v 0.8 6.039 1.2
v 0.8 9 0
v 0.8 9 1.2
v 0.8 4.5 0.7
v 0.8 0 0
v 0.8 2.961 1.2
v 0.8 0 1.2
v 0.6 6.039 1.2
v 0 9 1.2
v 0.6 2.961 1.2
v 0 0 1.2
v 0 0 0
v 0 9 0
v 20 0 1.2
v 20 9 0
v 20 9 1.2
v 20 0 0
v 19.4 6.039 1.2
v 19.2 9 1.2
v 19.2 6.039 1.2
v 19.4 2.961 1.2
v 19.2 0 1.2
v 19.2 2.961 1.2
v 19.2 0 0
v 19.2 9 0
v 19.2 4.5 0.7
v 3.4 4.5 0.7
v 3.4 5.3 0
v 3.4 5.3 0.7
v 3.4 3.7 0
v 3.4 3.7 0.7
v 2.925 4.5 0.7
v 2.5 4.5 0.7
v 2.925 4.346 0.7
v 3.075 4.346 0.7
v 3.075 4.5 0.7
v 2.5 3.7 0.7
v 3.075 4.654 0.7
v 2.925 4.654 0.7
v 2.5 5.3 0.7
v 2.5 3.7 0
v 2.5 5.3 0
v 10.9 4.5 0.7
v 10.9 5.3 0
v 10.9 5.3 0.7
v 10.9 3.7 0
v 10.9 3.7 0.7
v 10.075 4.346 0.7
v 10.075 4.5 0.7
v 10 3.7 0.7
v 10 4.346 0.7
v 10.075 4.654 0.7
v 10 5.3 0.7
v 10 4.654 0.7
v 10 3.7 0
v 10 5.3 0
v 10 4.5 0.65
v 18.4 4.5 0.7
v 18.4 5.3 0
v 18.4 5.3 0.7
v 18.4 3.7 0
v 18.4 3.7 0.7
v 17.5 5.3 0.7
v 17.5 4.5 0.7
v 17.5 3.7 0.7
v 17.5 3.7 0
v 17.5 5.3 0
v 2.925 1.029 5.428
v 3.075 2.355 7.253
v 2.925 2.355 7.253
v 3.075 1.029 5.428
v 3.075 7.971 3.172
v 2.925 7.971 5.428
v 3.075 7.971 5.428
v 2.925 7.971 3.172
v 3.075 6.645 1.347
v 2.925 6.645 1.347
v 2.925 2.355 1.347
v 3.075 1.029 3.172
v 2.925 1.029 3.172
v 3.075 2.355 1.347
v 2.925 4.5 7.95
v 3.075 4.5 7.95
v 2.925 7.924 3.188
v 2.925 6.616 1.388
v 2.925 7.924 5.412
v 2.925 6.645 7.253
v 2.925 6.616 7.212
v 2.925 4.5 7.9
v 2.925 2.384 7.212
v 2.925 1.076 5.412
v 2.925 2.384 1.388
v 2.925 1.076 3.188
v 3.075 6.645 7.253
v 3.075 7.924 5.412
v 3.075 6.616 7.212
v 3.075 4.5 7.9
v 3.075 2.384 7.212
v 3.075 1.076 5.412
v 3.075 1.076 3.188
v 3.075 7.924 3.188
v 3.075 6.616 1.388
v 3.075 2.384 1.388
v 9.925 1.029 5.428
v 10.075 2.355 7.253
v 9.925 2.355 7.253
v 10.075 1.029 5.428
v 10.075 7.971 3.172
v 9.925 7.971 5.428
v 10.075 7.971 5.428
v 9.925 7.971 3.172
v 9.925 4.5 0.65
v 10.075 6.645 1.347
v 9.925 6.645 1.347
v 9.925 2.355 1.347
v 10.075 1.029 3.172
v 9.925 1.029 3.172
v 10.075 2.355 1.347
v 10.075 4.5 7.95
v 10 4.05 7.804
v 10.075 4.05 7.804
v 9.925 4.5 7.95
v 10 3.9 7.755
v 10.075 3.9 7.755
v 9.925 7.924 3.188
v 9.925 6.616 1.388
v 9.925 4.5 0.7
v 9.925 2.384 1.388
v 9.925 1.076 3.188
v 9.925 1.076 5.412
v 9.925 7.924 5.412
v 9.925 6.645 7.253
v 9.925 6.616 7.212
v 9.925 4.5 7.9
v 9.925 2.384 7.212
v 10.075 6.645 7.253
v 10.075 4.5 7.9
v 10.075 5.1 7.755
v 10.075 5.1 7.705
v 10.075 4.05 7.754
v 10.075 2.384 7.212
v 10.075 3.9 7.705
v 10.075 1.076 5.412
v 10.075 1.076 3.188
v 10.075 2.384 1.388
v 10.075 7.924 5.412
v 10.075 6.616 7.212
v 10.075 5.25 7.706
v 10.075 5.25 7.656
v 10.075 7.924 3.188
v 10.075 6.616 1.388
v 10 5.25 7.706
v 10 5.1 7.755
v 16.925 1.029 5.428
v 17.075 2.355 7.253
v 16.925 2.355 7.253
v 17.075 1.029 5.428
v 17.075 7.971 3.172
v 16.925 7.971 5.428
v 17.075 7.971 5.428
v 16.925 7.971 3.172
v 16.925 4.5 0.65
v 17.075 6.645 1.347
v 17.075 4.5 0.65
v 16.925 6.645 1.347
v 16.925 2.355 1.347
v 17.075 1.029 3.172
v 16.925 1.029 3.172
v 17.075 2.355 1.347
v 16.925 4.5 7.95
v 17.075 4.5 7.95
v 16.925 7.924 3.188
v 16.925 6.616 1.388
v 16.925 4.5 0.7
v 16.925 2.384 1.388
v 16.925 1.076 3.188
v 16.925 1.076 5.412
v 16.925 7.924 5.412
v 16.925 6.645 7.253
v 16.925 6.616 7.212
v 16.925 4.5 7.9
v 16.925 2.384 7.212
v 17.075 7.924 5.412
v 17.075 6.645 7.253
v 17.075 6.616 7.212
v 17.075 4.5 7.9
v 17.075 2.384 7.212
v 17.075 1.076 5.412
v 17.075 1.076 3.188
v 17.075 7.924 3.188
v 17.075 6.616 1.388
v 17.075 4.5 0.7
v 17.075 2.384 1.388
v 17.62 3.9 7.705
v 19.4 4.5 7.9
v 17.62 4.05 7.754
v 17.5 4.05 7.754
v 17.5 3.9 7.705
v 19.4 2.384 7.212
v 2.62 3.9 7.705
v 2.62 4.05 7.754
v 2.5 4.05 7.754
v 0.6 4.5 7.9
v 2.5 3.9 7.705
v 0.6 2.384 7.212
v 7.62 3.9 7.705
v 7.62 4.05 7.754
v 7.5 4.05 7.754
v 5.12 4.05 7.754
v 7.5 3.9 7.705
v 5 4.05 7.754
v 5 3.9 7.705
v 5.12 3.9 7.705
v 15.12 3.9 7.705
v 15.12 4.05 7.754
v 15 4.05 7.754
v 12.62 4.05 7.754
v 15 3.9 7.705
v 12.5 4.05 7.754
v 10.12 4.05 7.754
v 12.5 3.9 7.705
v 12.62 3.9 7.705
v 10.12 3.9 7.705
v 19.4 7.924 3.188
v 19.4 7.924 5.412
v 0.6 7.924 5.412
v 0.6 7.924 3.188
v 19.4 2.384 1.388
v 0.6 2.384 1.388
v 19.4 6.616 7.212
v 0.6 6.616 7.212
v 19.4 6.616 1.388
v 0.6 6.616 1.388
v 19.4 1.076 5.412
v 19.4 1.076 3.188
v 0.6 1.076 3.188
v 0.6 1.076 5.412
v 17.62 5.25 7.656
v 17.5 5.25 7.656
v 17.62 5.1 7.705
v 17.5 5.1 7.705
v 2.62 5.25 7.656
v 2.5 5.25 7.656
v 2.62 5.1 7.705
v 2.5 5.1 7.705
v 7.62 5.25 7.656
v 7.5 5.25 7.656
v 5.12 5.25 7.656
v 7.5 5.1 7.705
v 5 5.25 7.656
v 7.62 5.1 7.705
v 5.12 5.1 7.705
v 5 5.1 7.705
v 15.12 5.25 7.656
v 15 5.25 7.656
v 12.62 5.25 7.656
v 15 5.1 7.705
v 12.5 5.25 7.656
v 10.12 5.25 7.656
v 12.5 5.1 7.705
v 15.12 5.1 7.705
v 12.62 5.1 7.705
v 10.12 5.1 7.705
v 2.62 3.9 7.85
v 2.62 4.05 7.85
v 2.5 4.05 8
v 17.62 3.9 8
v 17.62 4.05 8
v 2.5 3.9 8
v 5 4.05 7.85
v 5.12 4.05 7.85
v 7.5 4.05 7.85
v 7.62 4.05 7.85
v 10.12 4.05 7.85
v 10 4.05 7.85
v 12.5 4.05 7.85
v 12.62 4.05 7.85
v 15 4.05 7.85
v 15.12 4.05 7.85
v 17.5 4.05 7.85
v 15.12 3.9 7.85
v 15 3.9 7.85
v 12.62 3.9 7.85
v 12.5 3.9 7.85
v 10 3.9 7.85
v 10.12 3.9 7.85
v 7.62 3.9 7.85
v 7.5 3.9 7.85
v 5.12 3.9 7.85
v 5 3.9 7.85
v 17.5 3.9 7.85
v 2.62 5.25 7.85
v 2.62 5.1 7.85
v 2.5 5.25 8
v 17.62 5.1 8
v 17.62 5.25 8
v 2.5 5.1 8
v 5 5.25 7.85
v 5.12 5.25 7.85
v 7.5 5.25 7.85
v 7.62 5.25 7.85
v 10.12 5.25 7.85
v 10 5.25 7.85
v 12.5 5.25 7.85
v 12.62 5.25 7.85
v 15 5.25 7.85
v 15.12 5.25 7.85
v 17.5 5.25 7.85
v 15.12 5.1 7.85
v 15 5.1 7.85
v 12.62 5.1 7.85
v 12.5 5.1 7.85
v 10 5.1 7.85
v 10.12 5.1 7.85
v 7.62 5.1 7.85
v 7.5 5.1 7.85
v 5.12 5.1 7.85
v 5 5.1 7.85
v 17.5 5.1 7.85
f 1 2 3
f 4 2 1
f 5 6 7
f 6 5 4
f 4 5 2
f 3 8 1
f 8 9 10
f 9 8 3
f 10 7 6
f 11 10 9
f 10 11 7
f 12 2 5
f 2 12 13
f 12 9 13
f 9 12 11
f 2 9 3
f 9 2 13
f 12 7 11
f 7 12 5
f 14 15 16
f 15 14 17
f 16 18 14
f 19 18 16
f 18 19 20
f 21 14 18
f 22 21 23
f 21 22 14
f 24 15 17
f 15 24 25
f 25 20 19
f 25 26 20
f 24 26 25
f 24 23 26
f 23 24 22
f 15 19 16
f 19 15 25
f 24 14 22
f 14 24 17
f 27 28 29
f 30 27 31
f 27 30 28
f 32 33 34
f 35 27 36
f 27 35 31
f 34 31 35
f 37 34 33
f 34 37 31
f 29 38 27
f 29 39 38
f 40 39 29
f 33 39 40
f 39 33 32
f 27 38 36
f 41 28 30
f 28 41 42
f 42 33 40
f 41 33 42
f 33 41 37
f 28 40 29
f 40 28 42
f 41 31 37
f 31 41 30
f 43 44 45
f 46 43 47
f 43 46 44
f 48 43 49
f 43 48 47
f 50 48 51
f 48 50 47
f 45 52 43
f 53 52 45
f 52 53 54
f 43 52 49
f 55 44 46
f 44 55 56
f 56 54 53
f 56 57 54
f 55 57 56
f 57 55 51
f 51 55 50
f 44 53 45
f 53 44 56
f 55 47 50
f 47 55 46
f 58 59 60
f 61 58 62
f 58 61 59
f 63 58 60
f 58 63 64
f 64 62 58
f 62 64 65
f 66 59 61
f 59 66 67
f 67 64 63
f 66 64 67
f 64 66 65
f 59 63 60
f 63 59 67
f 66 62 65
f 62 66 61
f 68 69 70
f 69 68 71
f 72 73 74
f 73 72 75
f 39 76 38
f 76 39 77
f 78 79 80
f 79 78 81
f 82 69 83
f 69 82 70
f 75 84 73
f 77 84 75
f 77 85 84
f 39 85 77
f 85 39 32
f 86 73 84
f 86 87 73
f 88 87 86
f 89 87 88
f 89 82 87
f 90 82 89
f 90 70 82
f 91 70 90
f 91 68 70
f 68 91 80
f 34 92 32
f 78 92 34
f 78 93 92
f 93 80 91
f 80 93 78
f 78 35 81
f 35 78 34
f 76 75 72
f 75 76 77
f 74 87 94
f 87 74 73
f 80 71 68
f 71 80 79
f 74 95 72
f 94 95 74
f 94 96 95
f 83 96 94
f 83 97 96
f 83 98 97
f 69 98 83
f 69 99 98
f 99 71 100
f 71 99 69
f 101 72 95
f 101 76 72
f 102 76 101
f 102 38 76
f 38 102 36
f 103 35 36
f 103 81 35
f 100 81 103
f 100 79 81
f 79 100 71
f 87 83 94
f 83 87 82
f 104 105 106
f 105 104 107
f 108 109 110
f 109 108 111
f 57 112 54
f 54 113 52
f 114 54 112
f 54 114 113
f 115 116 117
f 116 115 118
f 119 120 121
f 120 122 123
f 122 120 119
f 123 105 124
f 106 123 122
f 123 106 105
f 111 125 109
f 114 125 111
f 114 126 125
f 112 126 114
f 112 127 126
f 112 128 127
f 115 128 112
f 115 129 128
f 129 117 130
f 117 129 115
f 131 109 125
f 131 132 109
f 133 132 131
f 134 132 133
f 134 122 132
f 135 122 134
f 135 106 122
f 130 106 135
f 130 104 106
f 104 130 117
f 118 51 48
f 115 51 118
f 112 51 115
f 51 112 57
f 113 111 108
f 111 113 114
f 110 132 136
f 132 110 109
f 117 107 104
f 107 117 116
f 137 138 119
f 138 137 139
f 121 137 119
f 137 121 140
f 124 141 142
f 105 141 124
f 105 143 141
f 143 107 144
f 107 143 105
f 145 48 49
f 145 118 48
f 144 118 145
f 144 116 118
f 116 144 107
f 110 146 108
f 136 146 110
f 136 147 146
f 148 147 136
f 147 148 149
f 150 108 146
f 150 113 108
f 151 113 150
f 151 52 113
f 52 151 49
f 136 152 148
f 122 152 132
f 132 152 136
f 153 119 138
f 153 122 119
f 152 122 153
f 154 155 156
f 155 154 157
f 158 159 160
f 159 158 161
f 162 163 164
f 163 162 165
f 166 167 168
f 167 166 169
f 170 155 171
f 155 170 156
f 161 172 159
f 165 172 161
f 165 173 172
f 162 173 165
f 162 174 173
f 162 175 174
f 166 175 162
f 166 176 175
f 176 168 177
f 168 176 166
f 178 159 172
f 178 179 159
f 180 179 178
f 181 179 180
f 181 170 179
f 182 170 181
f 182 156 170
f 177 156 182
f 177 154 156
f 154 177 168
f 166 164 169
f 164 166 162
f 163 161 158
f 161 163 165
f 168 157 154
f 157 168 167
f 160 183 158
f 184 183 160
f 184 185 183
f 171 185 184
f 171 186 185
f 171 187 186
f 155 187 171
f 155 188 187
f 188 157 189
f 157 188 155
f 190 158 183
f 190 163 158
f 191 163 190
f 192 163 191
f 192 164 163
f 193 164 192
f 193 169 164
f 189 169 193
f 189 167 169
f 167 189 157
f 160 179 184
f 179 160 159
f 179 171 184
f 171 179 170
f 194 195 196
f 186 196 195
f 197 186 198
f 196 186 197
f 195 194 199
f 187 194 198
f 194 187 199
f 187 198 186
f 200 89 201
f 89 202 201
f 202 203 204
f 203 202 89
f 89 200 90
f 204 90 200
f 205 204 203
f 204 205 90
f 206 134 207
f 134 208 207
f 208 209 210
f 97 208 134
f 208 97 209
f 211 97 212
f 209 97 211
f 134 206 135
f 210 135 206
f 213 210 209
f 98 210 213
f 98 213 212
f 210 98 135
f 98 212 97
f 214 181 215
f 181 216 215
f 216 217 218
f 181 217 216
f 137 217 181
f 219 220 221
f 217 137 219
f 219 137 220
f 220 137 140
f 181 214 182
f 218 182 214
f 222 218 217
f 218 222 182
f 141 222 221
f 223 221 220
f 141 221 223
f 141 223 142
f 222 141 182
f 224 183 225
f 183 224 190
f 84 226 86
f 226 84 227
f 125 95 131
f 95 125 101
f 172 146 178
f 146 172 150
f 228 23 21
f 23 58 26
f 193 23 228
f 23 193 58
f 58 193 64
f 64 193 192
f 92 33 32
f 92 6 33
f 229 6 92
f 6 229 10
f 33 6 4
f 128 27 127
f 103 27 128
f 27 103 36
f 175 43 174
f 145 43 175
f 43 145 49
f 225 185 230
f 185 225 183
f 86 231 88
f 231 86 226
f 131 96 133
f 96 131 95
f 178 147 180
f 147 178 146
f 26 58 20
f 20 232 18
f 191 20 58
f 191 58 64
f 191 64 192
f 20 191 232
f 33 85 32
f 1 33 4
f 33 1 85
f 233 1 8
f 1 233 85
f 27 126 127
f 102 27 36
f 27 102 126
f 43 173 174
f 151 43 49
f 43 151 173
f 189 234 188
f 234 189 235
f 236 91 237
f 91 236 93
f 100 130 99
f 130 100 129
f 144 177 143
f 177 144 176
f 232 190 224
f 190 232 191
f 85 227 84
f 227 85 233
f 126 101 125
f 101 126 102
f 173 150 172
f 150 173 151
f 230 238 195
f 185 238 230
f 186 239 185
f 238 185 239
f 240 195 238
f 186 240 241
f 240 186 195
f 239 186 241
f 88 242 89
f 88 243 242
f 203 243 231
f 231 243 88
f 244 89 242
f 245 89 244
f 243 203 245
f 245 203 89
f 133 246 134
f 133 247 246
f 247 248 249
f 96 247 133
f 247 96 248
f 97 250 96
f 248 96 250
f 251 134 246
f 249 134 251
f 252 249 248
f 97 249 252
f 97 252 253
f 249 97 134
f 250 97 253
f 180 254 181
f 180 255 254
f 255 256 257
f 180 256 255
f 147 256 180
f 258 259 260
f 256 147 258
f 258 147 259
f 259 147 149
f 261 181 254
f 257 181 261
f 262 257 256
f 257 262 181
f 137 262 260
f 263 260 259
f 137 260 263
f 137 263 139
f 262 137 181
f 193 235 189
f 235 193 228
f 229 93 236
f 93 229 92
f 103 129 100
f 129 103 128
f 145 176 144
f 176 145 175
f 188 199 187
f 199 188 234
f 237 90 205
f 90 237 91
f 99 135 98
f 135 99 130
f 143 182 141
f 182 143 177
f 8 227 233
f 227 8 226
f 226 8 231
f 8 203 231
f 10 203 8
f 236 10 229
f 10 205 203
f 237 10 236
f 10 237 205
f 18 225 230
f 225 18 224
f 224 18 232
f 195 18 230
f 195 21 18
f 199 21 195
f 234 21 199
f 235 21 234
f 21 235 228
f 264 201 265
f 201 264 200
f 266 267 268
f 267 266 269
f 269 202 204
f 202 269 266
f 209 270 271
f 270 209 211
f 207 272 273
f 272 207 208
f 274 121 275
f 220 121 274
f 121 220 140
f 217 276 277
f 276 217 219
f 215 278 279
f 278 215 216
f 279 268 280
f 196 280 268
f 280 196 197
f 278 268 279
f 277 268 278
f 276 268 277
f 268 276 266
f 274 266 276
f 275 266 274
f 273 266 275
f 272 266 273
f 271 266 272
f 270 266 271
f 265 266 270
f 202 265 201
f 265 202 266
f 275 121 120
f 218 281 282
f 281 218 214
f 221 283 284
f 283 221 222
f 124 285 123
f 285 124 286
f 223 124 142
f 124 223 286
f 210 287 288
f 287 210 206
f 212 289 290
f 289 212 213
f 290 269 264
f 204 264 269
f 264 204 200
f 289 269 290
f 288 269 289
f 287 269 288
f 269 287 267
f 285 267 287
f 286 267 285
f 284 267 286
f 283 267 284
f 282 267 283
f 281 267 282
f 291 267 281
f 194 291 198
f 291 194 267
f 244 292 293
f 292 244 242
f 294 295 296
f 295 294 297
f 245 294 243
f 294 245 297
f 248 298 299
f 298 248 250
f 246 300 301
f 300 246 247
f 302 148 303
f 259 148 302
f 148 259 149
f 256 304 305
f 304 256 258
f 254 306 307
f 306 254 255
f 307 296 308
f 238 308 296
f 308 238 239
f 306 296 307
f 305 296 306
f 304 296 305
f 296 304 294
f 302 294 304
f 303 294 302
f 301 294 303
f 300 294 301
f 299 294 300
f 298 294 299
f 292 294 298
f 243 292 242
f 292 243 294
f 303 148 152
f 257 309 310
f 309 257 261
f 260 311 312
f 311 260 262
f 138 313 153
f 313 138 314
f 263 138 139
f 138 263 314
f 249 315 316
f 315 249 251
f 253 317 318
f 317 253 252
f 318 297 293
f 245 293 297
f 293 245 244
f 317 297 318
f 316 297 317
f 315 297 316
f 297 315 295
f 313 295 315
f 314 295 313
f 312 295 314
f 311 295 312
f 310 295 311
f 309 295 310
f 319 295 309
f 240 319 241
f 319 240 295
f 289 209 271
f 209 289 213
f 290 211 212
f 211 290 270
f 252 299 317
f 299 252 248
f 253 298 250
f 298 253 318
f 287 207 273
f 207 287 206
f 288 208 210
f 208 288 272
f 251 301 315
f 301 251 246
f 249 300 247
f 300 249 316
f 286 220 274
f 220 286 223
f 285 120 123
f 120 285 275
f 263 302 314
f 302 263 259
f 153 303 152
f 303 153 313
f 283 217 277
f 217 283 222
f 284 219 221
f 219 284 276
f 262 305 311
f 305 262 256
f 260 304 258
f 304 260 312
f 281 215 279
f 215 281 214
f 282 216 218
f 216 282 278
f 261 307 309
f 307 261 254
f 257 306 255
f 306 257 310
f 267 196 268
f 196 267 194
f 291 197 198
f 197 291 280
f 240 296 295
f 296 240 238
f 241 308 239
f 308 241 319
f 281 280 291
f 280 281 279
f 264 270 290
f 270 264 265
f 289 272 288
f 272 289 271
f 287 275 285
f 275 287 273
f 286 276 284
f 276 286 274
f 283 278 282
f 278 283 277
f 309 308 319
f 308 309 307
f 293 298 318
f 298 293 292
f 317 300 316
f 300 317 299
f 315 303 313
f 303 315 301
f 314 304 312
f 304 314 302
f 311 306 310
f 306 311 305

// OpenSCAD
// 卧式油罐 (battle_tankh) — 炼油区/补给站储油罐
// 轴: x=宽(20), y=深(9), z=高(8); 原点在角(0,0,0); 罐体沿 X 卧放
// 端部鞍座(撑 bbox) + 3 支墩 + 圆柱罐体 + 顶部走道护栏
// 碰撞契约: 实心 20×9×7.5 → GLB bbox 必须精确 20×9×8
$fn = 10;

module saddles() {
  // 端部鞍座 (撑住 x bbox 0-20, 全深 y 0-9)
  color([0.48, 0.46, 0.44]) translate([0, 0, 0]) cube([0.8, 9, 1.2]);
  color([0.48, 0.46, 0.44]) translate([19.2, 0, 0]) cube([0.8, 9, 1.2]);
}

module supports() {
  // 3 支墩 (罐体下方垫高, z 0-0.7)
  for (x = [2.5, 10, 17.5]) {
    color([0.48, 0.46, 0.44]) translate([x, 3.7, 0]) cube([0.9, 1.6, 0.7]);
  }
}

module tank_body() {
  // 罐体: 半径 3.6, 长 18.4 (x 0.8-19.2), 中心 z=4.3 (罐底 0.7)
  color([0.60, 0.54, 0.45]) translate([10, 4.5, 4.3]) rotate([0, 90, 0]) cylinder(r = 3.6, h = 18.4, center = true);
  // 端盖 (罐两端扁平封板)
  color([0.55, 0.49, 0.41]) translate([0.8, 4.5, 4.3]) rotate([0, 90, 0]) cylinder(r = 3.6, h = 0.4, center = true);
  color([0.55, 0.49, 0.41]) translate([19.2, 4.5, 4.3]) rotate([0, 90, 0]) cylinder(r = 3.6, h = 0.4, center = true);
  // 罐体分节缝 (3 道细环)
  for (x = [3, 10, 17]) {
    color([0.52, 0.47, 0.40]) translate([x, 4.5, 4.3]) rotate([0, 90, 0]) cylinder(r = 3.65, h = 0.15, center = true);
  }
}

module rail() {
  // 顶部走道护栏 (罐顶 z≈7.9, 细条 z 7.85-8.0)
  color([0.42, 0.40, 0.38]) translate([2.5, 3.9, 7.85]) cube([15, 0.15, 0.15]);
  color([0.42, 0.40, 0.38]) translate([2.5, 5.1, 7.85]) cube([15, 0.15, 0.15]);
  // 护栏立柱
  for (x = [2.5 : 2.5 : 17.5]) {
    color([0.42, 0.40, 0.38]) translate([x, 3.9, 7.2]) cube([0.12, 0.15, 0.8]);
    color([0.42, 0.40, 0.38]) translate([x, 5.1, 7.2]) cube([0.12, 0.15, 0.8]);
  }
}

saddles();
supports();
tank_body();
rail();
